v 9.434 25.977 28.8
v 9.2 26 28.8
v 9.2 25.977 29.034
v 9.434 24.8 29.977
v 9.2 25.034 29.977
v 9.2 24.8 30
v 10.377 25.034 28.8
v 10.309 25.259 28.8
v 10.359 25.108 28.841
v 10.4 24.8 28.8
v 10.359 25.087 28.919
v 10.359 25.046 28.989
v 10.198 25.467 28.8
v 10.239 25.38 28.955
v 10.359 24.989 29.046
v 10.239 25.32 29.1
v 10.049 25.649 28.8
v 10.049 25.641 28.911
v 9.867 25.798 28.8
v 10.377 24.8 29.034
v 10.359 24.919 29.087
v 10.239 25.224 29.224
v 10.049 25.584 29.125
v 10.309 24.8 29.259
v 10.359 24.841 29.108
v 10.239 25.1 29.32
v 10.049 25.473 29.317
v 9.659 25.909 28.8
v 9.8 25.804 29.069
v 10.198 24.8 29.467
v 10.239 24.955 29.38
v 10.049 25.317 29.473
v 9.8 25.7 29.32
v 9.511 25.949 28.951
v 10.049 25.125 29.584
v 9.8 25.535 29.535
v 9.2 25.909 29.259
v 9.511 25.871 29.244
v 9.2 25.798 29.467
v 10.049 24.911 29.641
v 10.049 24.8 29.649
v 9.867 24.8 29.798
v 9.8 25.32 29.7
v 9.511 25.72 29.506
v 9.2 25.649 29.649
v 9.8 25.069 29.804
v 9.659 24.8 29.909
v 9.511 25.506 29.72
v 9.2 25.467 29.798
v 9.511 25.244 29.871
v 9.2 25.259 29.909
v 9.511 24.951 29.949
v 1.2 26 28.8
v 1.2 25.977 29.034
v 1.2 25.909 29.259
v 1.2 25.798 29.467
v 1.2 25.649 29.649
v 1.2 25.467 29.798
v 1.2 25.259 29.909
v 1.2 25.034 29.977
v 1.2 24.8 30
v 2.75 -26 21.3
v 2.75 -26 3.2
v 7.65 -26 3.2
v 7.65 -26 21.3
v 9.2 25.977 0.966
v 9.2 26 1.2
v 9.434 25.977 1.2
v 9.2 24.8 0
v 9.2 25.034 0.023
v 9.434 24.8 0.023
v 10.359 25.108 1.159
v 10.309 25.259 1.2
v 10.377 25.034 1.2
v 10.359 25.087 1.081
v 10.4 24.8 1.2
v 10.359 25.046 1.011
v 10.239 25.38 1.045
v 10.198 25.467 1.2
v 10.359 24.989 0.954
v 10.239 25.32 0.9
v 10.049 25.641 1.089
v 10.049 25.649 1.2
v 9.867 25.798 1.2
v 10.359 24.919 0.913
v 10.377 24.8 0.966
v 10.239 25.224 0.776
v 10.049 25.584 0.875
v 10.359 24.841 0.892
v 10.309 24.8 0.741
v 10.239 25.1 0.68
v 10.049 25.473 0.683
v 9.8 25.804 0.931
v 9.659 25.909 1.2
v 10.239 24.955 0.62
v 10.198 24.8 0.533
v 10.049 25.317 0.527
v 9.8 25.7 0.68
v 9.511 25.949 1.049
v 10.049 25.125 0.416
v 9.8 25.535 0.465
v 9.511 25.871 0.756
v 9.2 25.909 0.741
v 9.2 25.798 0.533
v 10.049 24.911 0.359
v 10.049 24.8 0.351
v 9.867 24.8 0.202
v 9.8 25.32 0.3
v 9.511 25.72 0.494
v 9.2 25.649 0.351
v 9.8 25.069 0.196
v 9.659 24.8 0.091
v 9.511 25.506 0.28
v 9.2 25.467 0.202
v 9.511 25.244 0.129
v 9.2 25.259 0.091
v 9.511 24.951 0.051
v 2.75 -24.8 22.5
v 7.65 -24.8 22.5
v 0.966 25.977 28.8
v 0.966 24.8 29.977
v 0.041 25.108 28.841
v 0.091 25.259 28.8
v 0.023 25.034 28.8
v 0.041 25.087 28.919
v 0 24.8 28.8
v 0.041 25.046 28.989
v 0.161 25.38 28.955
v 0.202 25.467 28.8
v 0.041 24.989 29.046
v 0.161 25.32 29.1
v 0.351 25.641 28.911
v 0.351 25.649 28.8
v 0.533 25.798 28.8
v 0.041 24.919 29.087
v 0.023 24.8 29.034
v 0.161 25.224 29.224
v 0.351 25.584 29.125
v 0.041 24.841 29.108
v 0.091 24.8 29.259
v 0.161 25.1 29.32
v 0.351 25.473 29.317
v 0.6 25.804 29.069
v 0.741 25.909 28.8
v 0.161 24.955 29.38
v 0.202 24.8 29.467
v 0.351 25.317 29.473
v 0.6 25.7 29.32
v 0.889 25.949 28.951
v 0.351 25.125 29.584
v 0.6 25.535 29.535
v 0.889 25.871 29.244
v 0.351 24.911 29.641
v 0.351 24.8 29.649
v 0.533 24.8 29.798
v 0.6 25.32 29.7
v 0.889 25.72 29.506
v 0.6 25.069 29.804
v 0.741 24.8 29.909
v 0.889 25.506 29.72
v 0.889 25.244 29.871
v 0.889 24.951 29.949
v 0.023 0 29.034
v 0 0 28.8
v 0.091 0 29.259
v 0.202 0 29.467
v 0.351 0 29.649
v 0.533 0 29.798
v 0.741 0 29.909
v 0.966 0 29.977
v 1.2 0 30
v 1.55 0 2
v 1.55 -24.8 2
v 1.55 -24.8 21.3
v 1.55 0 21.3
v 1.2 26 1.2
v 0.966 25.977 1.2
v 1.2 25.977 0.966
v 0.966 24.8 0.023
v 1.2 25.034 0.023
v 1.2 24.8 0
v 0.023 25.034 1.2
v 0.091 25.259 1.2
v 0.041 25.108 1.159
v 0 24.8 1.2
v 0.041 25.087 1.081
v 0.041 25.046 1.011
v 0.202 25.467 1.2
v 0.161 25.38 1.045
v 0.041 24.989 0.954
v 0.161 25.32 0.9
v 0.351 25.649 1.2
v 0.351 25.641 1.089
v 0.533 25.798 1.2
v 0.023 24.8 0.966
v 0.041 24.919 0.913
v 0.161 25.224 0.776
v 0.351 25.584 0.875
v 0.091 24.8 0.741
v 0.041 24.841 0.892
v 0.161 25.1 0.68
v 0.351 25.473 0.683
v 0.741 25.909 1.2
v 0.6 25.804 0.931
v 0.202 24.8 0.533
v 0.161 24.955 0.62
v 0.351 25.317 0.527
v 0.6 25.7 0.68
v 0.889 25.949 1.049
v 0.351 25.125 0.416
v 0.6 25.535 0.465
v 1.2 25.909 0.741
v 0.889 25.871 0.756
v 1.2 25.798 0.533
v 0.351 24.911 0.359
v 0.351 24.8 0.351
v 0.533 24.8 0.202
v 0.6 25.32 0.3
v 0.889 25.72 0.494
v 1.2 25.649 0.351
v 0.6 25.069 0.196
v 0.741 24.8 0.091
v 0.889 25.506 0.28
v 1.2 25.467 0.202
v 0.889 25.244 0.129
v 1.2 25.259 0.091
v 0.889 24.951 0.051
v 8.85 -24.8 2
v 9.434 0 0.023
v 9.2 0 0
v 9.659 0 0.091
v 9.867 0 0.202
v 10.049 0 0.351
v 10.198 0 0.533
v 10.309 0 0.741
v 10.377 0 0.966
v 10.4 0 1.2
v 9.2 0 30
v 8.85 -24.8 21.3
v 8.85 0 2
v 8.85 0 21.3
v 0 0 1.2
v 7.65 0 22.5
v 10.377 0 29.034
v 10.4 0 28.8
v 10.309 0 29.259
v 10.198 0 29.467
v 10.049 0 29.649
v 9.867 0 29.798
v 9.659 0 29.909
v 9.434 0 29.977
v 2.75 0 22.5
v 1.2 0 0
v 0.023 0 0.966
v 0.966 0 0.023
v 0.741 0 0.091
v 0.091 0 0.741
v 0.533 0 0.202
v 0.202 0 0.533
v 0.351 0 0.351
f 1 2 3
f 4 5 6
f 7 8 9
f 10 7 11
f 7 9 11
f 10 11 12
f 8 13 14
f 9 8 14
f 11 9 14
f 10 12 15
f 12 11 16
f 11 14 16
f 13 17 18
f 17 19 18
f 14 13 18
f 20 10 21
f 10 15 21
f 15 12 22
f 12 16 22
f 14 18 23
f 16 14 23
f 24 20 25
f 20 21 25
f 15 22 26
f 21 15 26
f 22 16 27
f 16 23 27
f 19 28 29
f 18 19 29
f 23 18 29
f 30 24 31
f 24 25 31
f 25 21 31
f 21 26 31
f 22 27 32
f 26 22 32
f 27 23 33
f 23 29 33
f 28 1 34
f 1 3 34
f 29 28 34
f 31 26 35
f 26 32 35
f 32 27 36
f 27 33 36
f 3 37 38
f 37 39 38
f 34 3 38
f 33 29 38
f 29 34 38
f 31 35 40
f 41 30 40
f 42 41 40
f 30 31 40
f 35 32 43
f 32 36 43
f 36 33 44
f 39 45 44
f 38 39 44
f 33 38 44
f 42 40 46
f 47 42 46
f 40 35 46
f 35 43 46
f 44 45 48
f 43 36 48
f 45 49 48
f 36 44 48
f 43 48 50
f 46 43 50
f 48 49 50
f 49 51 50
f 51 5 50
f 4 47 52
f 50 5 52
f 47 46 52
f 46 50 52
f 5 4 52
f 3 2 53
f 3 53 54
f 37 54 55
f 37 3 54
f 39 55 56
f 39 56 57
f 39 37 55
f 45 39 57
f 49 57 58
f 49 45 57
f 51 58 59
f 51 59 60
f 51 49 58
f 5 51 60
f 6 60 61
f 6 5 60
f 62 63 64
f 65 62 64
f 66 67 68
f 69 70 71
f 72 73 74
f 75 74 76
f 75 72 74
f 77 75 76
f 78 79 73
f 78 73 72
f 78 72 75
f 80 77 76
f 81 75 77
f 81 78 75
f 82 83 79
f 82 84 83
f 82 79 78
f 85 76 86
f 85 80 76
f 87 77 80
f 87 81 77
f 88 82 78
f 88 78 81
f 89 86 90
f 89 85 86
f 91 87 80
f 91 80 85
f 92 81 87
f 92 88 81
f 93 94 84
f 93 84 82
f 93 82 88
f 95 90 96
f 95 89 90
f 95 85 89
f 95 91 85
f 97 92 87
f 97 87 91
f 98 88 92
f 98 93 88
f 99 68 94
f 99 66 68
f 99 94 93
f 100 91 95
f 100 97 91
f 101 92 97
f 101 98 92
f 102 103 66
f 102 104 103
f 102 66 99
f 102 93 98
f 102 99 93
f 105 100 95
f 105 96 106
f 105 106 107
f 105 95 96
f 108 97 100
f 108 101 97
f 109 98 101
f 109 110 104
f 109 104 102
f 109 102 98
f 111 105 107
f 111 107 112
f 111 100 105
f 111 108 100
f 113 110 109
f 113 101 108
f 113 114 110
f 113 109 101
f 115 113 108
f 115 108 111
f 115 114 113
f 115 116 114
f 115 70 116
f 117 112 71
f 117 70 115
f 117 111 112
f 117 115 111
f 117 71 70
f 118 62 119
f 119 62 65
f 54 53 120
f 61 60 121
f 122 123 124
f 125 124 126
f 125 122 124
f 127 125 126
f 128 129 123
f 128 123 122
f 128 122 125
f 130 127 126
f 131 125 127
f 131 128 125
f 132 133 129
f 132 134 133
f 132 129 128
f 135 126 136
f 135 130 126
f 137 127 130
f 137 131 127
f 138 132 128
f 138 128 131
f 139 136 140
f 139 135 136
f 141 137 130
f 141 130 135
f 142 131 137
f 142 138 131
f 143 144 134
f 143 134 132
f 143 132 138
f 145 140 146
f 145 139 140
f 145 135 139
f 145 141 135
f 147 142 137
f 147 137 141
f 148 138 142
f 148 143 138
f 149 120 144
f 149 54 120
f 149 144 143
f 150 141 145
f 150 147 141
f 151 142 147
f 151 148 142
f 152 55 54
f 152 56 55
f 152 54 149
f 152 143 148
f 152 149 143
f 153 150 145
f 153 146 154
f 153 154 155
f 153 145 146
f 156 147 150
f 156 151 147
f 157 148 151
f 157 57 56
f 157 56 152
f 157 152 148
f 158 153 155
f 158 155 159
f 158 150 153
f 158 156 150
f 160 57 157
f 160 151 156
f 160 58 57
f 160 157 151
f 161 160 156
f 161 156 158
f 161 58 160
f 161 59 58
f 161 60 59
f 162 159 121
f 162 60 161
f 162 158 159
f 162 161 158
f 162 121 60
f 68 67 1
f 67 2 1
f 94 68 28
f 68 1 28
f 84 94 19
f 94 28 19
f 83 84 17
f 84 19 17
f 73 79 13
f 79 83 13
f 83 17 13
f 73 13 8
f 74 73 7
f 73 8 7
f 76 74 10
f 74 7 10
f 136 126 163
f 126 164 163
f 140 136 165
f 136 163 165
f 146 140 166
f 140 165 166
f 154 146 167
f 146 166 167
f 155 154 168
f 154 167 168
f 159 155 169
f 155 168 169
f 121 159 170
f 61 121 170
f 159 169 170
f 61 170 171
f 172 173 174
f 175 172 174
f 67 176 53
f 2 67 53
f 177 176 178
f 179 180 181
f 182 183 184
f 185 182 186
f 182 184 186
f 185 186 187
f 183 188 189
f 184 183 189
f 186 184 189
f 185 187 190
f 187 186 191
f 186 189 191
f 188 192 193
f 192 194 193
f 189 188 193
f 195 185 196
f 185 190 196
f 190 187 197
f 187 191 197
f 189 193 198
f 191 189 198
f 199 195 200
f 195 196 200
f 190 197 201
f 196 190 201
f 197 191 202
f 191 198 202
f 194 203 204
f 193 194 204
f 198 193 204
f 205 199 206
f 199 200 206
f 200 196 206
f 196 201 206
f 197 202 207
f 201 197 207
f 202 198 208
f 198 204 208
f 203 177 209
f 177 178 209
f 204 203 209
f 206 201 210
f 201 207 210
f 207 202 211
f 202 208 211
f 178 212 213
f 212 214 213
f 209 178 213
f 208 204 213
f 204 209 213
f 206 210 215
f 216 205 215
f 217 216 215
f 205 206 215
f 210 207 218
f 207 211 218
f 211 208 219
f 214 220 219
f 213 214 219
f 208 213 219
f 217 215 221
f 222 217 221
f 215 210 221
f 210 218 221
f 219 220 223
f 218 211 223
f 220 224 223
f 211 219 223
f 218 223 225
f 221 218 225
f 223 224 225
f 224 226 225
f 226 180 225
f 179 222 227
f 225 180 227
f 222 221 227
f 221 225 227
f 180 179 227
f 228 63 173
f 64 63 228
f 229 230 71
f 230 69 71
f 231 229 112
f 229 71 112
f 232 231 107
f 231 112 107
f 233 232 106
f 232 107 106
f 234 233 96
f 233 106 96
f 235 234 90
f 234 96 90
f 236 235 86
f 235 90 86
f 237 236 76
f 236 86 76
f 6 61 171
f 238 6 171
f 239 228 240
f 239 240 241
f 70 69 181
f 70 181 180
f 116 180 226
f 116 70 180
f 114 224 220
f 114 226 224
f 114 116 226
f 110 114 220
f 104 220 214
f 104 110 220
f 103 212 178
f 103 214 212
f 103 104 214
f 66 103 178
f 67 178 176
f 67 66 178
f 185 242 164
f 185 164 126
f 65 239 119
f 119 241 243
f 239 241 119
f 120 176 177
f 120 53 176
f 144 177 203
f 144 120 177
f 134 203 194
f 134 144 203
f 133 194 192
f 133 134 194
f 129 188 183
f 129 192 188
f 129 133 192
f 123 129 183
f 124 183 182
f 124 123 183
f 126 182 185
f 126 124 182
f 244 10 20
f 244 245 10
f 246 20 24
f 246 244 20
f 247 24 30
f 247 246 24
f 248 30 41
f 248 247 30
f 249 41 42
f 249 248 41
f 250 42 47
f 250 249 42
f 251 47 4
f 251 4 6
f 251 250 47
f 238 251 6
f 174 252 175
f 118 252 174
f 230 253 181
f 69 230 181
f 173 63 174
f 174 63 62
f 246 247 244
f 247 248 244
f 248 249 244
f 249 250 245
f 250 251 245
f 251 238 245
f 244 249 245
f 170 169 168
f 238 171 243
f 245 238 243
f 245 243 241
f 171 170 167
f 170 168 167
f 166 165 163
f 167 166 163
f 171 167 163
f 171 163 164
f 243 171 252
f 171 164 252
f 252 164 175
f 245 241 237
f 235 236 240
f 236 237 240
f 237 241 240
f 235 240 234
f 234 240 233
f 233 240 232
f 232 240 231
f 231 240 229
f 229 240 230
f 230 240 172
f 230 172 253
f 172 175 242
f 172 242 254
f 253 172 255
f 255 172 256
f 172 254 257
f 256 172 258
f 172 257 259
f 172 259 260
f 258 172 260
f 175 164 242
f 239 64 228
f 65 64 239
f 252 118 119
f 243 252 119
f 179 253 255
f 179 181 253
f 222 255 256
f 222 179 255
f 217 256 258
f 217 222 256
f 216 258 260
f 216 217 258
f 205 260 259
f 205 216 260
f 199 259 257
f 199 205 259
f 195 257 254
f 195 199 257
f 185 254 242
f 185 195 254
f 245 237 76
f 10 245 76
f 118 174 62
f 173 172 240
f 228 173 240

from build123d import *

# Parameters (mm, degrees)
F1_DEPTH = 10.4
F2_W     = 7.3
F2_H     = 20.5
F3_DEPTH = 26
F4_R     = 1.2
F5_SIZE  = 1.2


with BuildPart() as f1:
    # F0 (on Right) → F1 (new body)
    with BuildSketch(Plane.YZ):
        Polygon((0, 7.5), (0, 0), (26, 0), (26, 30), (0, 30), (0, 28), align=None)
    extrude(amount=F1_DEPTH)

    # F2 (on face) → F3 (join)
    with BuildSketch(Plane.XZ):
        with Locations((5.2, 12.25)):
            Rectangle(F2_W, F2_H)
    extrude(amount=F3_DEPTH)

    # F4
    f4_edges = [f1.edges().sort_by_distance(p)[0] for p in [
        (5.2, 26, 0),
        (5.2, 26, 30),
        (0, 26, 15),
        (10.4, 26, 15),
        (0, 13, 0),
        (10.4, 13, 0),
        (0, 13, 30),
        (10.4, 13, 30),
    ]]
    fillet(f4_edges, radius=F4_R)

    # F5
    f5_edges = [f1.edges().sort_by_distance(p)[0] for p in [
        (1.55, -26, 12.25),
        (8.85, -26, 12.25),
        (8.85, -13, 22.5),
        (1.55, -13, 22.5),
        (5.2, -26, 22.5),
        (5.2, -26, 2),
    ]]
    chamfer(f5_edges, length=F5_SIZE)


solid = f1.part
